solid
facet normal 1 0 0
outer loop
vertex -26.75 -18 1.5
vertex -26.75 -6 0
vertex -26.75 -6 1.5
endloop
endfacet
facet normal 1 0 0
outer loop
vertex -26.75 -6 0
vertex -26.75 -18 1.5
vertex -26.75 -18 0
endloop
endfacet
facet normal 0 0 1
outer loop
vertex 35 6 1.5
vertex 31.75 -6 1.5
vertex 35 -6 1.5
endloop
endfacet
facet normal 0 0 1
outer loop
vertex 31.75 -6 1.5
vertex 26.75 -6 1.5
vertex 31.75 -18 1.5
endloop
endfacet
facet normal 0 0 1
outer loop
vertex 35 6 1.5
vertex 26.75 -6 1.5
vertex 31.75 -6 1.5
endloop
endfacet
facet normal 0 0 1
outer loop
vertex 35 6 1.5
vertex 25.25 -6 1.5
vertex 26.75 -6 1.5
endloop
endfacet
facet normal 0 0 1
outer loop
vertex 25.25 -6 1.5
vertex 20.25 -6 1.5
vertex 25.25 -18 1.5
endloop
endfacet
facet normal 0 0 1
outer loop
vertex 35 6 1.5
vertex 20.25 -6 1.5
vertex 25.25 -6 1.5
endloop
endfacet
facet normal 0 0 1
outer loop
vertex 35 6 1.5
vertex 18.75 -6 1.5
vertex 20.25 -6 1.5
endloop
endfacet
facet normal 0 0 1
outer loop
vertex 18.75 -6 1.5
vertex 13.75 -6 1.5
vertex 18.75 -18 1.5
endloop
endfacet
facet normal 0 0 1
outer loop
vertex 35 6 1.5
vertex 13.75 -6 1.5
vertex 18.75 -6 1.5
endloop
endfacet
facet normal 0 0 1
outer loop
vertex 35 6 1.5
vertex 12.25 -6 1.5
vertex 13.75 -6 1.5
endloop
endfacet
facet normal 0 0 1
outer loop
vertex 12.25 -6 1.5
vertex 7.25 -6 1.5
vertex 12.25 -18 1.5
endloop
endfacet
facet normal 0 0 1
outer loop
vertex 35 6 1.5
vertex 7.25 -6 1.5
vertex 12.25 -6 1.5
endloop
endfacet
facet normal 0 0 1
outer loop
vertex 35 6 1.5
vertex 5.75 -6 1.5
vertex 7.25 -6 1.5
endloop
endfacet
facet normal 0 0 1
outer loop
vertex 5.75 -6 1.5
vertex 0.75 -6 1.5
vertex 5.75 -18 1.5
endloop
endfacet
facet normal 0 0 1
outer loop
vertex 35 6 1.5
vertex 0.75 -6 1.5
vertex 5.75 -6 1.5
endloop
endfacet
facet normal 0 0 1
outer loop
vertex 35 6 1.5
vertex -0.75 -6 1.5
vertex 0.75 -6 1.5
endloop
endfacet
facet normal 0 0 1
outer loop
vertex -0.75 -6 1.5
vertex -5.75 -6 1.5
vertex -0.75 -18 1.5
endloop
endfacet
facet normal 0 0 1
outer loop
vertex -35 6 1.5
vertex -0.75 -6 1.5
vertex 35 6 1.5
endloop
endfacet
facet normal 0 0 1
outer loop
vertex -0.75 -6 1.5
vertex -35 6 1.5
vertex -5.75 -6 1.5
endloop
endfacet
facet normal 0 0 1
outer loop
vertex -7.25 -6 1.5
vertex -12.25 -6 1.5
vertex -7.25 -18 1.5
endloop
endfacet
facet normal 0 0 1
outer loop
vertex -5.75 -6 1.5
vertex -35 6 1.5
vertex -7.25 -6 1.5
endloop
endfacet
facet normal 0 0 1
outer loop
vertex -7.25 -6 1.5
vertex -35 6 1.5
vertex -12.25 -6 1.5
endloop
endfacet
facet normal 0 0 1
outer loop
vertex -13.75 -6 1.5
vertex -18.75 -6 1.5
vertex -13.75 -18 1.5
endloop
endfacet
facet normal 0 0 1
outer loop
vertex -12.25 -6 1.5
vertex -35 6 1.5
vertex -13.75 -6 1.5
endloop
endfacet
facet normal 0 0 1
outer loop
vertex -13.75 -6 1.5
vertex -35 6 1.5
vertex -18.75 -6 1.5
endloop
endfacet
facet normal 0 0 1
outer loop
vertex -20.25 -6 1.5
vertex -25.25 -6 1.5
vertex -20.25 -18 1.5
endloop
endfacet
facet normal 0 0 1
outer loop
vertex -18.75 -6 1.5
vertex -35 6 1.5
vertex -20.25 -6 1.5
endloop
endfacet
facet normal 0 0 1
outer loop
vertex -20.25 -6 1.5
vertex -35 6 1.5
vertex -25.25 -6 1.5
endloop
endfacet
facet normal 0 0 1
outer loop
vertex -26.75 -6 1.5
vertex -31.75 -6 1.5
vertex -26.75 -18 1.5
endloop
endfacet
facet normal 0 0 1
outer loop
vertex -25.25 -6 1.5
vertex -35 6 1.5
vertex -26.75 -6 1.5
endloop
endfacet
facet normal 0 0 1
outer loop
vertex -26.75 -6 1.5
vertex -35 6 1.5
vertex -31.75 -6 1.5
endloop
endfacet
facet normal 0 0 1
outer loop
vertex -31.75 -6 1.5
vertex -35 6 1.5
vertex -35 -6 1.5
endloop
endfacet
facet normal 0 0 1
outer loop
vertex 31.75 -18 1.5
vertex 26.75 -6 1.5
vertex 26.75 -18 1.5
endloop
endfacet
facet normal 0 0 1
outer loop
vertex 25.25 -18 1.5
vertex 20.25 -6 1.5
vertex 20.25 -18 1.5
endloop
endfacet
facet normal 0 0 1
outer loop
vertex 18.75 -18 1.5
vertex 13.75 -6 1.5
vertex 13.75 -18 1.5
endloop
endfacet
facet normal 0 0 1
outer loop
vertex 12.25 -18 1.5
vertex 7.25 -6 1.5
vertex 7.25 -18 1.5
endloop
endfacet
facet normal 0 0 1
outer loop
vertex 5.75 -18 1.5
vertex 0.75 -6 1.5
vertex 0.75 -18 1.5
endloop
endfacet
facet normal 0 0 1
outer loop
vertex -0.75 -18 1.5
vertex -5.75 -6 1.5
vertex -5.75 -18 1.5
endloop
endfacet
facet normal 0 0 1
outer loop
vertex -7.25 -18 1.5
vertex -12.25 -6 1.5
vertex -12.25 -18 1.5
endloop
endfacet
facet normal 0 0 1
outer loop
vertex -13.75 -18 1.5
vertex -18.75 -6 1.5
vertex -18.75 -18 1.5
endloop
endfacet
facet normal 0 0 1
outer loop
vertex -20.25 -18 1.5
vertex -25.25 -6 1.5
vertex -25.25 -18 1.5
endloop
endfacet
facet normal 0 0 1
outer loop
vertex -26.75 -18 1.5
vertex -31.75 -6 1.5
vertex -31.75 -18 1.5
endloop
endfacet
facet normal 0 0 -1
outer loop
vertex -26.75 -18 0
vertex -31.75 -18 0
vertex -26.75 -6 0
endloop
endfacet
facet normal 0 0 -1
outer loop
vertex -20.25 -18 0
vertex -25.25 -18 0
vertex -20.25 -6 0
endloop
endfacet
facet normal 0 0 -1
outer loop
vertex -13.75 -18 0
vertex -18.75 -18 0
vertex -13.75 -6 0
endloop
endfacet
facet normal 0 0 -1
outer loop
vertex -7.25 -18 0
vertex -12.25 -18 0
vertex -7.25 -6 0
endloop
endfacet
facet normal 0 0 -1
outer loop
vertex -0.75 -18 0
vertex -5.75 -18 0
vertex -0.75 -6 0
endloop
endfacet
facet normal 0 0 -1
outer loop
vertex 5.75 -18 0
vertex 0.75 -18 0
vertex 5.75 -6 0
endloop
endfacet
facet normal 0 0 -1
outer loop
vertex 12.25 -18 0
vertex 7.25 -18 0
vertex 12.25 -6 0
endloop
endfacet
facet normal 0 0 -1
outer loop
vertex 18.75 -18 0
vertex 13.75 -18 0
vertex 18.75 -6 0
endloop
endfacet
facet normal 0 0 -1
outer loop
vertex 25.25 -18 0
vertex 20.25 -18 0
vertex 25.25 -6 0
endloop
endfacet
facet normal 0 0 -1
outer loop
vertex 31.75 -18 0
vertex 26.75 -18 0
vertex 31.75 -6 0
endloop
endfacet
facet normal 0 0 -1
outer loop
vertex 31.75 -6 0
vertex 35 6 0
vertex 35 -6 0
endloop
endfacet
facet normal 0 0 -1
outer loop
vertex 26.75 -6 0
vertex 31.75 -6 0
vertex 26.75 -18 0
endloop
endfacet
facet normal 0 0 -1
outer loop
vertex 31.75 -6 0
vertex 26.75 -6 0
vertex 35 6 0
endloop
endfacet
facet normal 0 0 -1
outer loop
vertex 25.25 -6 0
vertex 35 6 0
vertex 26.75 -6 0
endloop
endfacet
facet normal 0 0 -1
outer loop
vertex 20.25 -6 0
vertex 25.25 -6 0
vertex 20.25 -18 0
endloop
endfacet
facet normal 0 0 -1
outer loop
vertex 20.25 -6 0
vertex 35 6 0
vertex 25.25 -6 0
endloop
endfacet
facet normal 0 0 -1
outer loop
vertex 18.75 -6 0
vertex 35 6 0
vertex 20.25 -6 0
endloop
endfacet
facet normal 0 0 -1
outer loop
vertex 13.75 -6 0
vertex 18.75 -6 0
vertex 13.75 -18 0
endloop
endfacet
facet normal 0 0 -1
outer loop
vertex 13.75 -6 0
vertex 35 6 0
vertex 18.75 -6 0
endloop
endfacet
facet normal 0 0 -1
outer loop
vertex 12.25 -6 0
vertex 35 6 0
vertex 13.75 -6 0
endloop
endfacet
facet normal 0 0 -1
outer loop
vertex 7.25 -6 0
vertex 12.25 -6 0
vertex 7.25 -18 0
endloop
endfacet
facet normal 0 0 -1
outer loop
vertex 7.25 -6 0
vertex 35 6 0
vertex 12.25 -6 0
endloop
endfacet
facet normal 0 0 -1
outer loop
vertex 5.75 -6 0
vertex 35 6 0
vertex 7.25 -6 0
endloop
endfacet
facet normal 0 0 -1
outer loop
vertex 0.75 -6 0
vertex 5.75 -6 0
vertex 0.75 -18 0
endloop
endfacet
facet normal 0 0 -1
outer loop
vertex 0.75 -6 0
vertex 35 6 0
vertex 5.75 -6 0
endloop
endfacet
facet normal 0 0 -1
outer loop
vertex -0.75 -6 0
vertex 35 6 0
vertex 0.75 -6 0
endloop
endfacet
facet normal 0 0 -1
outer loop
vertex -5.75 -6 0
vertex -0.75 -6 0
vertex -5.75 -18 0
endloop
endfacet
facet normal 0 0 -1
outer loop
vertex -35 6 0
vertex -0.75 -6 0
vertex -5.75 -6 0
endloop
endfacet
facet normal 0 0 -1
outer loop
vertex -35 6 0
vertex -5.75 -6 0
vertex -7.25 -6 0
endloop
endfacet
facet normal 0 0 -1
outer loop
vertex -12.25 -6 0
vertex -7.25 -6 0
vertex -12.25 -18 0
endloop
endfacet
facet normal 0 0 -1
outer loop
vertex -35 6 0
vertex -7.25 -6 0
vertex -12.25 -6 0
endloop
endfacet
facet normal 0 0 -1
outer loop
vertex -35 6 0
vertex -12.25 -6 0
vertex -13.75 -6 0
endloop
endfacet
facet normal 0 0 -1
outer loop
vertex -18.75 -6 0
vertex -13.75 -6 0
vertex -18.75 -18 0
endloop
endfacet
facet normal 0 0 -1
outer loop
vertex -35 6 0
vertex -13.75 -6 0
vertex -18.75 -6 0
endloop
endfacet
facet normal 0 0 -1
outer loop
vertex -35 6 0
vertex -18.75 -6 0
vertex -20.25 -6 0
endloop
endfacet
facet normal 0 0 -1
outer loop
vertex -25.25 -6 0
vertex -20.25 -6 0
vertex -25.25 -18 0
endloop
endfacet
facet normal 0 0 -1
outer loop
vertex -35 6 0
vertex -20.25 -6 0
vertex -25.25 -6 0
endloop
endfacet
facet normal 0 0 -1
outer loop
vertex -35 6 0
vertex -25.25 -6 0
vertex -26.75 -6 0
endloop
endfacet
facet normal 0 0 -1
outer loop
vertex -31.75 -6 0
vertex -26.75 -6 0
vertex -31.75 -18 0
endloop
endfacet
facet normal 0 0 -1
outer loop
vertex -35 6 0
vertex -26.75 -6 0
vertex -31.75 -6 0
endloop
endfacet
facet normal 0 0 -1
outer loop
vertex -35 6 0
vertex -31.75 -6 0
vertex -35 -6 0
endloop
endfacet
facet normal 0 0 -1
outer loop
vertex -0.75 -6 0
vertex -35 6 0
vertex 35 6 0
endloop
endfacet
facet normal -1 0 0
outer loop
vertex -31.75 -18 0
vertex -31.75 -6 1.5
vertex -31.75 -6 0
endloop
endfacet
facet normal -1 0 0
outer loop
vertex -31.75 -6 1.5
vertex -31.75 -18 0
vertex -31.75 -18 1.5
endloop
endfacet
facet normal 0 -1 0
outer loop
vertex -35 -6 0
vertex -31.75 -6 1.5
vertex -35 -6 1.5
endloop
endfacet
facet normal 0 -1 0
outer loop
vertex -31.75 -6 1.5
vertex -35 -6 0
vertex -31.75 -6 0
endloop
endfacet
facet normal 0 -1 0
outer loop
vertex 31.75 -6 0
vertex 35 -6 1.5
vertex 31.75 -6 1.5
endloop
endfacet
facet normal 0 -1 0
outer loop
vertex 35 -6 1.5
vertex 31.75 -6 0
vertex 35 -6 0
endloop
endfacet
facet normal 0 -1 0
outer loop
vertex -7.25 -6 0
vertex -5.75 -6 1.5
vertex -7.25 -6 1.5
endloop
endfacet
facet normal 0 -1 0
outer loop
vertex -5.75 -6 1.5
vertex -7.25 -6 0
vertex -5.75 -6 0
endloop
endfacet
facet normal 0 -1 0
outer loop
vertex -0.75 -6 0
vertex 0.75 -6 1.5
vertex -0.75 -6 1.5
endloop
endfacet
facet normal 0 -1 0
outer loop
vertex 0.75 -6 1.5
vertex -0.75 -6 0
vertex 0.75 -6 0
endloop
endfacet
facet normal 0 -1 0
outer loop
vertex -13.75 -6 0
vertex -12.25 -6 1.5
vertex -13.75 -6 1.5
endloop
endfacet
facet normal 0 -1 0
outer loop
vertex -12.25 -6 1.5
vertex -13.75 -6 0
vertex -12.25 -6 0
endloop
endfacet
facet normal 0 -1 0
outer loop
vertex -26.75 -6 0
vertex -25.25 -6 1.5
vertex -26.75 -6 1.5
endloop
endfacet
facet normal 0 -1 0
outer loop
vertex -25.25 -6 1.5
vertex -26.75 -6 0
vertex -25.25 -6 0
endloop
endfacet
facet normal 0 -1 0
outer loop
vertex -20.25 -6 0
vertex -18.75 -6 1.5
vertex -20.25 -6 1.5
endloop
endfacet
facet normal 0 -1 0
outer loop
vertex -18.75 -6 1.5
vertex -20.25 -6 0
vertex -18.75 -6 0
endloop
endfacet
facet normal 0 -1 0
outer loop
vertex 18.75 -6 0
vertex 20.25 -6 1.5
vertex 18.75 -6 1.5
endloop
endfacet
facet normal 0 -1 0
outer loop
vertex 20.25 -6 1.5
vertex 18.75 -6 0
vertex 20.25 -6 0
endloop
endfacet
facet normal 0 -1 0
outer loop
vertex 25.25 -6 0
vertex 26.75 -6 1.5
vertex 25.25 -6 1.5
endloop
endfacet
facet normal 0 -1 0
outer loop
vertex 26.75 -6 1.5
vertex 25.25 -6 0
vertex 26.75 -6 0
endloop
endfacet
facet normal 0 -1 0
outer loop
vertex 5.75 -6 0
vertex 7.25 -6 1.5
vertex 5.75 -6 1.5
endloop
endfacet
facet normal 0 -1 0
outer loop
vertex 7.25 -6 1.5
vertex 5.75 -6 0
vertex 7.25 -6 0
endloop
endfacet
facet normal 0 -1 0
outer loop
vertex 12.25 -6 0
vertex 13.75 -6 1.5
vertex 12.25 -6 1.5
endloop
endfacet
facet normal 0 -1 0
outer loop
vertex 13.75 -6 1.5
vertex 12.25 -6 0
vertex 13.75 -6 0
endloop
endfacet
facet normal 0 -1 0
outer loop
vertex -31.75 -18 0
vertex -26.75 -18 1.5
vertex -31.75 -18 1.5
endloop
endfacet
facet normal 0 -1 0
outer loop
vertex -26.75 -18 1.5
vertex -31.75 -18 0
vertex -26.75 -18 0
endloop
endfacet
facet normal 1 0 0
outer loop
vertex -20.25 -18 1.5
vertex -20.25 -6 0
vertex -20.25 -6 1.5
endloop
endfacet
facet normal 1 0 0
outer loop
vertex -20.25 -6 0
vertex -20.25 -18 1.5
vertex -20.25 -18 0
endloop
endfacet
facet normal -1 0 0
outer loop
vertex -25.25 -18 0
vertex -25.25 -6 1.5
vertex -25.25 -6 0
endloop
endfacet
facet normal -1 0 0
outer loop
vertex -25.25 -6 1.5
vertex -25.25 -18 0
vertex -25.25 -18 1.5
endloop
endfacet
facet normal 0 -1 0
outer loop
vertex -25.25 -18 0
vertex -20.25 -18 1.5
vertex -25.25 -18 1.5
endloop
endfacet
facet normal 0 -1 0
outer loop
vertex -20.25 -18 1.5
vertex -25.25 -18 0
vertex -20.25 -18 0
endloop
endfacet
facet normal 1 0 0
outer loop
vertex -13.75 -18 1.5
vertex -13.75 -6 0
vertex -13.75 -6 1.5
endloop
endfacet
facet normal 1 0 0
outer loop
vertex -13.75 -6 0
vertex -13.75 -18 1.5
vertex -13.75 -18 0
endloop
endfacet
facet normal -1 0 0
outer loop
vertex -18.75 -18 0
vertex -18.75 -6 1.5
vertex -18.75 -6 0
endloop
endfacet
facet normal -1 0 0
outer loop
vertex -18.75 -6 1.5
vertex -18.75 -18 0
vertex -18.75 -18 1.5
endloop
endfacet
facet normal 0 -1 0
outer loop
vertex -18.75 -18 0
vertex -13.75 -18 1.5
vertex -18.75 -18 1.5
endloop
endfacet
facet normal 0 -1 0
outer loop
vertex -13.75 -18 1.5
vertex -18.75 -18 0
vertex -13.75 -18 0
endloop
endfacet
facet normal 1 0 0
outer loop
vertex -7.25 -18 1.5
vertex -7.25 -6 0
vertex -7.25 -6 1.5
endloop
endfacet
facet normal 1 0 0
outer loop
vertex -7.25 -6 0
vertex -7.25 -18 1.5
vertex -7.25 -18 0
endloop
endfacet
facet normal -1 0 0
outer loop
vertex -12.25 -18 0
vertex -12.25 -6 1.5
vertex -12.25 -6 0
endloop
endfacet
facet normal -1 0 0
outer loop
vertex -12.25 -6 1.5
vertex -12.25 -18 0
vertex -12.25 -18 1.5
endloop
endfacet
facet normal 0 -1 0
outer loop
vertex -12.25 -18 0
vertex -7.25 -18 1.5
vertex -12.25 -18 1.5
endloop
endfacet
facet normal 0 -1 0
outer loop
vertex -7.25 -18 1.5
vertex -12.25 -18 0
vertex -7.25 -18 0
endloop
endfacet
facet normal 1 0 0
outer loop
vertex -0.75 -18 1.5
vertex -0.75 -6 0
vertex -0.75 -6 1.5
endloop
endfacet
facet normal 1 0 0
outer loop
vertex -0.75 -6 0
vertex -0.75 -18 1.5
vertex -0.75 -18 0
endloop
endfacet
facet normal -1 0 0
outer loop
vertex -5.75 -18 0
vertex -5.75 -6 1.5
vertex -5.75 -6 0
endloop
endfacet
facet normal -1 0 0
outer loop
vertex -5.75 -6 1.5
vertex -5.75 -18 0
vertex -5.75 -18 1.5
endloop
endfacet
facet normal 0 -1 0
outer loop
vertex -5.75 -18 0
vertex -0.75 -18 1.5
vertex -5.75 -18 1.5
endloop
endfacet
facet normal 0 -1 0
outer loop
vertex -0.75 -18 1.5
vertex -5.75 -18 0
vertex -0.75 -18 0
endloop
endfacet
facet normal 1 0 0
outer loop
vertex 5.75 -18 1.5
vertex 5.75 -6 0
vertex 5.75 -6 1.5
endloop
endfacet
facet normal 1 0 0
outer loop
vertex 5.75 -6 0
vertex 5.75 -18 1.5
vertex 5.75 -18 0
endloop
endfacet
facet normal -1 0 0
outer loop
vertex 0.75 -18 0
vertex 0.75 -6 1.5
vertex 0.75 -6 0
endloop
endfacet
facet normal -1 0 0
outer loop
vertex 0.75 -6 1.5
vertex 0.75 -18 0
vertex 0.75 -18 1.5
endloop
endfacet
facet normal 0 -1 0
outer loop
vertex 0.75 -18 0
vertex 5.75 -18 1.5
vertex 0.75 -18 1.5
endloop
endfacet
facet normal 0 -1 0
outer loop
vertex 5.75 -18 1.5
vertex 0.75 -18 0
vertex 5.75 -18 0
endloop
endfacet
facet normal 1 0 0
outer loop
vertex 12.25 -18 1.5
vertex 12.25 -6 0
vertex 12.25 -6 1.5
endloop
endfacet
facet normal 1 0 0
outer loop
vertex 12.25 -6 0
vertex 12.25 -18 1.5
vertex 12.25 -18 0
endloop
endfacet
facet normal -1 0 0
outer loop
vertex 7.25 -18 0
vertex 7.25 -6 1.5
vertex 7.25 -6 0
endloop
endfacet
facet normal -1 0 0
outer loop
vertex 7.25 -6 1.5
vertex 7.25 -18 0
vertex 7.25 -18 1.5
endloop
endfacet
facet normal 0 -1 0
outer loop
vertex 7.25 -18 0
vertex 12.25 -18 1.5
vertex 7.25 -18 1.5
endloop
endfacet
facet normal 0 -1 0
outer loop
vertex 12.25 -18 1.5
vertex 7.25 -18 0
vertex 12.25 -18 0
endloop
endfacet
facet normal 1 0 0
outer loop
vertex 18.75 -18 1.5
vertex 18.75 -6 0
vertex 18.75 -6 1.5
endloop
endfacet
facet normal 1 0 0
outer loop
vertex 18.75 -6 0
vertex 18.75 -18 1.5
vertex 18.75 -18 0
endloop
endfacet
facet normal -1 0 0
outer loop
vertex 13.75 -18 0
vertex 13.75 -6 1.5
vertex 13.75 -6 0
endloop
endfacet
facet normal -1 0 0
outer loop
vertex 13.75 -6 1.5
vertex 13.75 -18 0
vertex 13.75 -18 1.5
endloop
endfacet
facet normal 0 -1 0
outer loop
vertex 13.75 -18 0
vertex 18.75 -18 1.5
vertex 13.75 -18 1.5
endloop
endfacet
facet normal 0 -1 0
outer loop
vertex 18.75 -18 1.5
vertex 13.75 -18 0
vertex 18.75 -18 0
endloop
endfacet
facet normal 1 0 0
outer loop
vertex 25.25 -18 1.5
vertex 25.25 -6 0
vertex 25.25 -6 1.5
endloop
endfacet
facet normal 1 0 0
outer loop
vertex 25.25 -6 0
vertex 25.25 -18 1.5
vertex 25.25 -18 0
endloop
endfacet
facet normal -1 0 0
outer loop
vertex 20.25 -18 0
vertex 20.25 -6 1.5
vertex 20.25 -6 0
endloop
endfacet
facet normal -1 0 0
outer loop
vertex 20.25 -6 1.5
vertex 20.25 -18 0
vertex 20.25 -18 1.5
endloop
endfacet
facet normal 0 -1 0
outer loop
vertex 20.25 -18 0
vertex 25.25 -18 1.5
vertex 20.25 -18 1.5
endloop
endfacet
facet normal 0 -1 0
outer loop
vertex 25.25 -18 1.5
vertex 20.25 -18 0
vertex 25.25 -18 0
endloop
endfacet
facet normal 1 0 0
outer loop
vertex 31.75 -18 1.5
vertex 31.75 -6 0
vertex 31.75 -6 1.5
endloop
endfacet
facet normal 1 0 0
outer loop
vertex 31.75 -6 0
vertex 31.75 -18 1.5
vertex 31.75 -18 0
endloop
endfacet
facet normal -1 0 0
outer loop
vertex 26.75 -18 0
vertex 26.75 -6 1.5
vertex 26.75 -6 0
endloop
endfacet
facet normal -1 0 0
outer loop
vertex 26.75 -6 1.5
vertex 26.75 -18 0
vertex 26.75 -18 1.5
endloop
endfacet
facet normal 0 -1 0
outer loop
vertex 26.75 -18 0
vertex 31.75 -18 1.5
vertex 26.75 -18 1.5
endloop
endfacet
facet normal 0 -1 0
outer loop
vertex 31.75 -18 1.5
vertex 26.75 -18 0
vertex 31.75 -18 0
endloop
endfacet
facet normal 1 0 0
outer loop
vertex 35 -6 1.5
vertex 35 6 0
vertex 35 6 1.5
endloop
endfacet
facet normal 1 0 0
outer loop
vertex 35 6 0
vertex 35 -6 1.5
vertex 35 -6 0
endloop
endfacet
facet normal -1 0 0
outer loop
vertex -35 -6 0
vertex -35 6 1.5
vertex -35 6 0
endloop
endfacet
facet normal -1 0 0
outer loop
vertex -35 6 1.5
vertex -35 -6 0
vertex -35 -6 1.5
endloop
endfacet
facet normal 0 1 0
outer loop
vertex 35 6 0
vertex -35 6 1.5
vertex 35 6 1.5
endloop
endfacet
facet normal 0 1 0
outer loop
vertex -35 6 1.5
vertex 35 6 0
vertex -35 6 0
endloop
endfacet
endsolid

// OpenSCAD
// 10-well agarose gel comb
// Print orientation: lying flat on XY plane, z=0

// Overall plate dimensions
plate_thickness = 1.5;    // Z thickness (mm)
spine_length = 70;         // X length (mm)
spine_width = 12;          // Y width (mm)

// Tooth dimensions
tooth_width = 5.0;         // X width (mm)
tooth_length = 12;         // Y length (mm) (extends in -Y from spine edge)

// Gap between teeth
gap_width = 1.5;           // X gap (mm)

// Number of teeth
num_teeth = 10;

// Calculate total width of teeth + gaps
total_tooth_width = num_teeth * tooth_width;
total_gap_width = (num_teeth - 1) * gap_width;
total_tooth_group_width = total_tooth_width + total_gap_width;

// Center the tooth group on the spine in X
tooth_group_offset_x = (spine_length - total_tooth_group_width) / 2;

// Position of first tooth in X (relative to origin)
first_tooth_x = tooth_group_offset_x;

// Spine extends in +Y from center, teeth hang in -Y
// Spine Y range: [-spine_width/2, spine_width/2]
// Teeth start at spine bottom edge: y = -spine_width/2
// Teeth extend to: y = -spine_width/2 - tooth_length

$fn = 64;

// Main spine plate
union() {
    // Spine body - centered at origin in X, spanning -spine_width/2 to +spine_width/2 in Y
    translate([-spine_length/2, -spine_width/2, 0])
        cube([spine_length, spine_width, plate_thickness], center = false);
    
    // Add teeth
    for (i = [0 : num_teeth - 1]) {
        tooth_x = first_tooth_x + i * (tooth_width + gap_width);
        translate([tooth_x - spine_length/2, -spine_width/2 - tooth_length, 0])
            cube([tooth_width, tooth_length, plate_thickness], center = false);
    }
}
